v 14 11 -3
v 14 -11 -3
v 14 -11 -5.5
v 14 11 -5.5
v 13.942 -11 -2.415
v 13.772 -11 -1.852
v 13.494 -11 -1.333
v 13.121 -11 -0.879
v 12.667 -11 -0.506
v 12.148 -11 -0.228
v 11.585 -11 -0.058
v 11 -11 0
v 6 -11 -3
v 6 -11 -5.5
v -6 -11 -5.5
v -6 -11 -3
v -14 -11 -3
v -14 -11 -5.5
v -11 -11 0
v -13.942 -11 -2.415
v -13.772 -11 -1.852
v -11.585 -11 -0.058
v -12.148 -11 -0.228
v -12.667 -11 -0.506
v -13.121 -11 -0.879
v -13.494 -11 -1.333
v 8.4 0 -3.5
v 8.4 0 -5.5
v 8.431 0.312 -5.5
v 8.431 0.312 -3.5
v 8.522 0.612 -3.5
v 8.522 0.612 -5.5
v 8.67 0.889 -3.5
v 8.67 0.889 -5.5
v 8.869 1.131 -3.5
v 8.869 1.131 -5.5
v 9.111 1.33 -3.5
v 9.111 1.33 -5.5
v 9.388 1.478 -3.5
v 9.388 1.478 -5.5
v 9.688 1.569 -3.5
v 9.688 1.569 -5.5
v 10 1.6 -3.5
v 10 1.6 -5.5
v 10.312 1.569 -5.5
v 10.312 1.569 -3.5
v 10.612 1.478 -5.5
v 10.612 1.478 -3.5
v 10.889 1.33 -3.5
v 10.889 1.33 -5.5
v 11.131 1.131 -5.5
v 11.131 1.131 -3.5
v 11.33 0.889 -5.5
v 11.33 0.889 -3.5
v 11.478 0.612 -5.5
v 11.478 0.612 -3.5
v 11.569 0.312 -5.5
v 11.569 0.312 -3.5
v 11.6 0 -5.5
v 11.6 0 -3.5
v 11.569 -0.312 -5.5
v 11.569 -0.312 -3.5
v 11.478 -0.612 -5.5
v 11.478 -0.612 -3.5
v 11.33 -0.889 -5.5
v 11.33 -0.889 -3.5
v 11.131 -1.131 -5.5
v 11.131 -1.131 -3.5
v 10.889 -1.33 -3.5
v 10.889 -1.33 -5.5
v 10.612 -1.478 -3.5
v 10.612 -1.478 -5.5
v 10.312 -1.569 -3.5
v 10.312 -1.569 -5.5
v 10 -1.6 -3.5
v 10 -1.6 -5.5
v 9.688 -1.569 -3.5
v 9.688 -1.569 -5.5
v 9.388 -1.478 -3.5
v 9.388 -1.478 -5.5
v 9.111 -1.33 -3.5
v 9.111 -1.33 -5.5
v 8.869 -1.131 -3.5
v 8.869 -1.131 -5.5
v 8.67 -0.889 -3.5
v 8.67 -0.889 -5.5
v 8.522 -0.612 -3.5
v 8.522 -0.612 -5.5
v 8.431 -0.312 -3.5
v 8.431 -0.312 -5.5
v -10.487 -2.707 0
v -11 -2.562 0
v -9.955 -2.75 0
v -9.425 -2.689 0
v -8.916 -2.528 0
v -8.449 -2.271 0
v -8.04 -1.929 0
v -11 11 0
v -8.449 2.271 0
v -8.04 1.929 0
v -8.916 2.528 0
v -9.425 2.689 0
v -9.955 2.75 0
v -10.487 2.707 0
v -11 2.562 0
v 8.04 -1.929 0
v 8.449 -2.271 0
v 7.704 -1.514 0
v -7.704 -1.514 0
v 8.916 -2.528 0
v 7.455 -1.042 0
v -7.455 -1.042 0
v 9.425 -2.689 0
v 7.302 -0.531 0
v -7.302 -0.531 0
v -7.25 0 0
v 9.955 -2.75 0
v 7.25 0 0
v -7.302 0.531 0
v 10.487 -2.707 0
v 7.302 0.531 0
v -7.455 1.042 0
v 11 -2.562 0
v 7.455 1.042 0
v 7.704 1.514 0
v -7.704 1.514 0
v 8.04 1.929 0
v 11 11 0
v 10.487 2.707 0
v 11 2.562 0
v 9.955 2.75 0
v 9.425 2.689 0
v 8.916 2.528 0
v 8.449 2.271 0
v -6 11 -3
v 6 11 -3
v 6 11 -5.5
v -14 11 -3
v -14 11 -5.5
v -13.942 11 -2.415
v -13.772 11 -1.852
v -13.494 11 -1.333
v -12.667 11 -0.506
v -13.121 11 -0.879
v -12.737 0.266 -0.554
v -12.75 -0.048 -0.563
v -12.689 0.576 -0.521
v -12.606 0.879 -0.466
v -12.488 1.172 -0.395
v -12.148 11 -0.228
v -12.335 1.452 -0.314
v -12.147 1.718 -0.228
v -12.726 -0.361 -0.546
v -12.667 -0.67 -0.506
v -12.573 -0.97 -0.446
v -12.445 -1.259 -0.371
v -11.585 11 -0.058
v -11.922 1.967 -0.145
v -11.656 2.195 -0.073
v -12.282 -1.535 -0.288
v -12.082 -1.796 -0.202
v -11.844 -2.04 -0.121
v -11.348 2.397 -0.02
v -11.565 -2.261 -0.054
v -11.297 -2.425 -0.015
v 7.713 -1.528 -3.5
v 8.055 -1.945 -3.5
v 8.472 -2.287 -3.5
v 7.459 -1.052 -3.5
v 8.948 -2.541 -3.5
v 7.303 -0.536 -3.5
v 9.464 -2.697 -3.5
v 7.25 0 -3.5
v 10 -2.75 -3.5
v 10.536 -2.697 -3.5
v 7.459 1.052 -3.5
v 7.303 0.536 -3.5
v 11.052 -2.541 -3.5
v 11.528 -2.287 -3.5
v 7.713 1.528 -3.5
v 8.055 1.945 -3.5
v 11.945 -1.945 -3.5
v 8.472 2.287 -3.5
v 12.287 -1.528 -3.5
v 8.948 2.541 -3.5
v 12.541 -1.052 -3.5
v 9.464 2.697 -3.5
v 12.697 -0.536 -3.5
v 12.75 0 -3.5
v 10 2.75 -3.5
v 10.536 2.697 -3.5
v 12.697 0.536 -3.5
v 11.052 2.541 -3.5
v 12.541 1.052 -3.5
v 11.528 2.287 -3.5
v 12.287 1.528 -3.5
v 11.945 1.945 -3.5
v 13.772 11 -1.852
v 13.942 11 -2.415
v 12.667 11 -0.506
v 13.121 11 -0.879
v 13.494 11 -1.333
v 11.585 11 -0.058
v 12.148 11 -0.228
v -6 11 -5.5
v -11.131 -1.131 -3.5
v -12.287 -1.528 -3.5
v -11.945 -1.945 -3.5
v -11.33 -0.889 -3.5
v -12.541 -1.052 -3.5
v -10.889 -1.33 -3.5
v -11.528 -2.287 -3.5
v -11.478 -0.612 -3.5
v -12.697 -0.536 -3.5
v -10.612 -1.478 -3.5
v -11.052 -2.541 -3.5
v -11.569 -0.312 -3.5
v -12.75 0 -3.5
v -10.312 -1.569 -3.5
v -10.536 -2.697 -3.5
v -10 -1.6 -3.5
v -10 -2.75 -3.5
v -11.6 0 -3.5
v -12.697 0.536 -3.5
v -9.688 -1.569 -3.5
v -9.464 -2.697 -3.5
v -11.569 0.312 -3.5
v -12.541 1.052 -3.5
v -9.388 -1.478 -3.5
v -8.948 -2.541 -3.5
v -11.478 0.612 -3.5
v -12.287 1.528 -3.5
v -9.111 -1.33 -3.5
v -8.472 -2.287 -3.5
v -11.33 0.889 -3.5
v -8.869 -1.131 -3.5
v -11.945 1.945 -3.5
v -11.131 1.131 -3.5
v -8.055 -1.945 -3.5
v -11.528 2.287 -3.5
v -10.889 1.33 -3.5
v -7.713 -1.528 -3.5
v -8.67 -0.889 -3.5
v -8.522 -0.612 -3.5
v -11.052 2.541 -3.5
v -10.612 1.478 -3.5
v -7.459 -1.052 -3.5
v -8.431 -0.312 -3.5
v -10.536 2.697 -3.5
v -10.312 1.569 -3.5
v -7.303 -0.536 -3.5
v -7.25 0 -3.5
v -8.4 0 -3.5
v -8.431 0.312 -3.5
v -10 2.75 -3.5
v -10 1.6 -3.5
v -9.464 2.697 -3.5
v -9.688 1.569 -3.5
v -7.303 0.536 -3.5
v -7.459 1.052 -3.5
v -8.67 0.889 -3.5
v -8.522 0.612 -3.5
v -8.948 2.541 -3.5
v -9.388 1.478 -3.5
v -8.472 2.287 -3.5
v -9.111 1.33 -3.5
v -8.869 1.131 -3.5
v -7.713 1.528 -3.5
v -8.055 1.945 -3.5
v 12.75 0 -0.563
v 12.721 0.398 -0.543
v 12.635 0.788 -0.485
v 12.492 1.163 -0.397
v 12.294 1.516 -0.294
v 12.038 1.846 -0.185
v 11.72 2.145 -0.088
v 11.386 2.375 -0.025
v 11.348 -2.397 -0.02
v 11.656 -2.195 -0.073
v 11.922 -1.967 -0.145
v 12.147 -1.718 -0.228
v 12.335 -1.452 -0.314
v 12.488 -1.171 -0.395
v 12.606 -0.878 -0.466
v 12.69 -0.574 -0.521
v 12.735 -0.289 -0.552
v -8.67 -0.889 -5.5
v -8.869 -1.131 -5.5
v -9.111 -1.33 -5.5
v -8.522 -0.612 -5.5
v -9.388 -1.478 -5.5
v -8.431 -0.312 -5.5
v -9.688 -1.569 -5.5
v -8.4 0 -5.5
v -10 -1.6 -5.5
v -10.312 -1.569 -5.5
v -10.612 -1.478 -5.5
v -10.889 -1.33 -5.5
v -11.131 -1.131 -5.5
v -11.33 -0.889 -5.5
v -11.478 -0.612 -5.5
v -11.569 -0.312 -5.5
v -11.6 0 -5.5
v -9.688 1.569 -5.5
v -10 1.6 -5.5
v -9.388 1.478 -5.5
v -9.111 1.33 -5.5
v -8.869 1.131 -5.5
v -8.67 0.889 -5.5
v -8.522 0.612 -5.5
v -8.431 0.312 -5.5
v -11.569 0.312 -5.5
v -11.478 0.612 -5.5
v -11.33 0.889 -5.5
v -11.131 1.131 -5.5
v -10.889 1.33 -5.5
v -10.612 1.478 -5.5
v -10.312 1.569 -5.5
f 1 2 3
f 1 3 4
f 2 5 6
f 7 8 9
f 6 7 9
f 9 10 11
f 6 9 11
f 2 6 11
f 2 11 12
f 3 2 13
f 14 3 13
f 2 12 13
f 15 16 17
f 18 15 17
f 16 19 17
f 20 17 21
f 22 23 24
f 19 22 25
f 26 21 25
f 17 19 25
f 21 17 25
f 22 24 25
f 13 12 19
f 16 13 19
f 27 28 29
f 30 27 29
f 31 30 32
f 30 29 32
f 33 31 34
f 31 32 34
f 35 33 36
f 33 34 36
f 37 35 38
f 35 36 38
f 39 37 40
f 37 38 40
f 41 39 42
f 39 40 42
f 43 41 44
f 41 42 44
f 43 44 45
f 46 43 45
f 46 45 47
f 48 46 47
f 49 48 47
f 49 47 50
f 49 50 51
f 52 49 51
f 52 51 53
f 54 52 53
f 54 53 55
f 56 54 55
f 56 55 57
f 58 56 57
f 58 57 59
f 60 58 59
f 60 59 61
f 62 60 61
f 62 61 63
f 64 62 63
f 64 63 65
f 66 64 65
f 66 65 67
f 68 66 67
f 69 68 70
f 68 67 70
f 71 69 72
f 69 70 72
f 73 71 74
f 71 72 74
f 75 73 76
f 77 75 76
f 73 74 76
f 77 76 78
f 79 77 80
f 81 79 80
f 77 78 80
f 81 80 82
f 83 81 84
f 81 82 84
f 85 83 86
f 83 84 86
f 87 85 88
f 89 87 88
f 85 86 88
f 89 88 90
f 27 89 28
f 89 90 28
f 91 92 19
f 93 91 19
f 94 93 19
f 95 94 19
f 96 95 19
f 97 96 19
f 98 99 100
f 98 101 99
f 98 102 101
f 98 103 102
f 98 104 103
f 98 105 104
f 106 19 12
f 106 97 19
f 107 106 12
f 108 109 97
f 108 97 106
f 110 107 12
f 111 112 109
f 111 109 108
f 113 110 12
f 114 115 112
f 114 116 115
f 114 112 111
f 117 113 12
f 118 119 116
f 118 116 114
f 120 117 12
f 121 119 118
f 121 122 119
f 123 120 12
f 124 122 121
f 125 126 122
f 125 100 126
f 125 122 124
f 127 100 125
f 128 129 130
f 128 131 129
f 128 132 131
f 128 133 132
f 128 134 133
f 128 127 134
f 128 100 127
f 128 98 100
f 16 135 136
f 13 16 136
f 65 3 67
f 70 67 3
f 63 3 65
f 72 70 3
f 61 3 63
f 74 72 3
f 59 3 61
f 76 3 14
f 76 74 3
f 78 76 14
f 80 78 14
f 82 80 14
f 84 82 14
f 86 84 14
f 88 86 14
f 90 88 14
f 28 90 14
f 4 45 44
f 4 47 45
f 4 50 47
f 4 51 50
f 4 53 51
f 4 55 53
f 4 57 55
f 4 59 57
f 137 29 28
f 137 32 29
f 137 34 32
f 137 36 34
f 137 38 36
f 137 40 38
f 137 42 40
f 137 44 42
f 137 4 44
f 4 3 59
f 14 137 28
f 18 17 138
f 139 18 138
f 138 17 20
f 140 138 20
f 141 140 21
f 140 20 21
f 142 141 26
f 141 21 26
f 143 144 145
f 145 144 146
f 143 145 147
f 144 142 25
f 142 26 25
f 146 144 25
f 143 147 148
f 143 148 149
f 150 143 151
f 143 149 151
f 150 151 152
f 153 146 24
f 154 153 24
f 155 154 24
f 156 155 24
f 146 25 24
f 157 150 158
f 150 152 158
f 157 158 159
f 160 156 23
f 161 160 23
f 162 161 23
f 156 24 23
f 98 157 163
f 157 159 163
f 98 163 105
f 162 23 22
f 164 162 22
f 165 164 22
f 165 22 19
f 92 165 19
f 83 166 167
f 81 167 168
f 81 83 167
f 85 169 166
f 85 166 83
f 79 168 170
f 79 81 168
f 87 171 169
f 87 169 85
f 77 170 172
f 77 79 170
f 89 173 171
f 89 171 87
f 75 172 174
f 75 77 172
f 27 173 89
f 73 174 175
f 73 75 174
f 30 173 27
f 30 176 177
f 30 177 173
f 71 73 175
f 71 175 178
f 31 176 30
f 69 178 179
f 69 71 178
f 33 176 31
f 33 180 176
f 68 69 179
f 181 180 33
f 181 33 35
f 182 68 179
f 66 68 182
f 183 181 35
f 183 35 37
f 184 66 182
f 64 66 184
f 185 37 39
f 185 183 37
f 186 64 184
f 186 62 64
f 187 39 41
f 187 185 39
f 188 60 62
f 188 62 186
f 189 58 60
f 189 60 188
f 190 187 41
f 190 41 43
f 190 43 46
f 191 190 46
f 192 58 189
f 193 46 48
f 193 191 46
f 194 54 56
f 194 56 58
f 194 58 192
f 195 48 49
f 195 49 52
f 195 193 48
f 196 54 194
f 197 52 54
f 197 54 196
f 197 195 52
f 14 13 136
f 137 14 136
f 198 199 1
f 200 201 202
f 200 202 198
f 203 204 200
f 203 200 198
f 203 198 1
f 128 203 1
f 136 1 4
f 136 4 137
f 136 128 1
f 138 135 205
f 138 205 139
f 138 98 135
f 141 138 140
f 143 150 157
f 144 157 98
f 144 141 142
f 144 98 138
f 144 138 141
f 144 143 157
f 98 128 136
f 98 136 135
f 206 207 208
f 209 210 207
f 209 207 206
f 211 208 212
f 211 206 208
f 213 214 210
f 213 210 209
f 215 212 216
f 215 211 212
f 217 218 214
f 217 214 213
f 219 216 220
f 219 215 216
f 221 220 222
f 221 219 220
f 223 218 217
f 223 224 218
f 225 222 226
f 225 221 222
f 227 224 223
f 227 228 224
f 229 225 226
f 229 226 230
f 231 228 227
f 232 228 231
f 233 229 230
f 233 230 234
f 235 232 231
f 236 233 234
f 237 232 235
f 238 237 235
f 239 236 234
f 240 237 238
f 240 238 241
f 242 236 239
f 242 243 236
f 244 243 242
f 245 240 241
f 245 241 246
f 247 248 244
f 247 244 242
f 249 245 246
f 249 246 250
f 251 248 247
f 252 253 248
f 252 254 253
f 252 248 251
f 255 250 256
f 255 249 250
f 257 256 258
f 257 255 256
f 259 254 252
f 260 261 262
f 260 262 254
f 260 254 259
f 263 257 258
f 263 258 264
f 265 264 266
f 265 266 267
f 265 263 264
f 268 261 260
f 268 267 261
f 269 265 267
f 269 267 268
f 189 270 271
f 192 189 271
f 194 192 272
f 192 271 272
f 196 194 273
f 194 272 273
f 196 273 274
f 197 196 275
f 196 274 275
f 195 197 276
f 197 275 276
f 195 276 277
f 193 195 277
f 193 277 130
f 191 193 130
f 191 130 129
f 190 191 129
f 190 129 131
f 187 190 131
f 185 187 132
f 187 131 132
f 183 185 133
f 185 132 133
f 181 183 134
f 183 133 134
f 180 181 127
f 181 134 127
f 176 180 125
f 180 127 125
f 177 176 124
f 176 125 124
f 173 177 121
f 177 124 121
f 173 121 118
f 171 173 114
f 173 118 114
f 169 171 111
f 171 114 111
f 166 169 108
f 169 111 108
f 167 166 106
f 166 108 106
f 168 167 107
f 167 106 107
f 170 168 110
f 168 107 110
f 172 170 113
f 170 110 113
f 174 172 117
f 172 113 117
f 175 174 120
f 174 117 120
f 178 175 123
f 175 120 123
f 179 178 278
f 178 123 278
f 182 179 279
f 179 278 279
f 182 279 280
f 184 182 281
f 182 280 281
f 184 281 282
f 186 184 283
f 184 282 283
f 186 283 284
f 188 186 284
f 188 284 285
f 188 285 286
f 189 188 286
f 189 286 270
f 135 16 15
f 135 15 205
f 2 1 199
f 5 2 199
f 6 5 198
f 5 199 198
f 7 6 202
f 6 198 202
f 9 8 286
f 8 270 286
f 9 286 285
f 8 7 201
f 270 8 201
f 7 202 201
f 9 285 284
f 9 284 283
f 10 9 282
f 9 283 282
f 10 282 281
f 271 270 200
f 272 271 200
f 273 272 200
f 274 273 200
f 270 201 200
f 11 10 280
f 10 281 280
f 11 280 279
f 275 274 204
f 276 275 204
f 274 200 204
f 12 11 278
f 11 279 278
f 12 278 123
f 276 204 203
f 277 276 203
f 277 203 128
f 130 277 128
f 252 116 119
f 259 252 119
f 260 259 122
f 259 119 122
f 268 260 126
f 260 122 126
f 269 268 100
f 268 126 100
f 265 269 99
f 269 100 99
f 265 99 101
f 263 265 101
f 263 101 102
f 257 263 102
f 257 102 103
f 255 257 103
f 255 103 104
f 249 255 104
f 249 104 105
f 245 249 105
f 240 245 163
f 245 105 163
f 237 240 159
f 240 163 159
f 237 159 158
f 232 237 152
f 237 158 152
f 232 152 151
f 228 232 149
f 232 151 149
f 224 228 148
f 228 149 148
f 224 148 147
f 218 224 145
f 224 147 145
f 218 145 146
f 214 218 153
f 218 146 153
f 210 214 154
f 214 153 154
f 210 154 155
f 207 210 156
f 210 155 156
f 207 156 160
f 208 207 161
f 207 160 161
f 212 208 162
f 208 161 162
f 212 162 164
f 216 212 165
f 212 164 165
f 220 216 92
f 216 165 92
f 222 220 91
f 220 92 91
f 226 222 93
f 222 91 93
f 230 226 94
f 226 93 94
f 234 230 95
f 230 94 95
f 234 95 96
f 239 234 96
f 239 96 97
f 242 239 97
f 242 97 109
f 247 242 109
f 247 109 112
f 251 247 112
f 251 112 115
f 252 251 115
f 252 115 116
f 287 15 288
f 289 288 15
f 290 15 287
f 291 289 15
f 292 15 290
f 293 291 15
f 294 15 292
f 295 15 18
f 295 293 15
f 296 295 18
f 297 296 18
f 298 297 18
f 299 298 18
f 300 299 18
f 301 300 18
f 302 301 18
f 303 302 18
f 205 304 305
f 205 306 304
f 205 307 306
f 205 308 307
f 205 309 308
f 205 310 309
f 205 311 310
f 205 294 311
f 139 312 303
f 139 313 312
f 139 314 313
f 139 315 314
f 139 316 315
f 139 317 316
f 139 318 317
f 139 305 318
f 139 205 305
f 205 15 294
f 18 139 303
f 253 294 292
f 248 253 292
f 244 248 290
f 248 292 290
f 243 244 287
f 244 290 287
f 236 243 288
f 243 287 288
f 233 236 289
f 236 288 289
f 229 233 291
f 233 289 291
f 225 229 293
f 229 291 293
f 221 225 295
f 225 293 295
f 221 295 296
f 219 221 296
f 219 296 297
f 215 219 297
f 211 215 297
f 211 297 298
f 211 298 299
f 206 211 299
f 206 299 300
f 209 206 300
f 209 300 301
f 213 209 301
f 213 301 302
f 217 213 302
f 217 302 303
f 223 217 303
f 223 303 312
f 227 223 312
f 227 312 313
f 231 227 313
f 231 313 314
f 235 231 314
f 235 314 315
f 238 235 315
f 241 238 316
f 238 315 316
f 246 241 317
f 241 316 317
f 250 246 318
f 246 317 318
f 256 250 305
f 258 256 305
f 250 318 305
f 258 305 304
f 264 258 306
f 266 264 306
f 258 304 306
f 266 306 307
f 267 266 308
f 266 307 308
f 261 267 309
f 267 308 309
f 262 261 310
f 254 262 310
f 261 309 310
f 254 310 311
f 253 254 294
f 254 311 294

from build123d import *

# Parameters (mm, degrees)
SKETCH1_W           = 28
SKETCH1_H           = 22
BOSS_EXTRUDE1_DEPTH = 3
SKETCH2_W           = 8
SKETCH2_H           = 22
BOSS_EXTRUDE2_DEPTH = 2.5
SKETCH3_R           = 1.6
CUT_EXTRUDE1_DEPTH  = 19.634645154
SKETCH4_R           = 2.75
CUT_EXTRUDE2_DEPTH  = 3.5
FILLET1_R           = 3


with BuildPart() as part:
    # Sketch1 → Boss-Extrude1 (new body)
    with BuildSketch(Plane.XY):
        Rectangle(SKETCH1_W, SKETCH1_H)
    extrude(amount=-BOSS_EXTRUDE1_DEPTH)

    # Sketch2 → Boss-Extrude2 (add)
    with BuildSketch(Plane(origin=(0, 0, -3), x_dir=(-1, 0, 0), z_dir=(0, 0, -1))):
        with Locations((10, 0)):
            Rectangle(SKETCH2_W, SKETCH2_H)
        with Locations((-10, 0)):
            Rectangle(SKETCH2_W, SKETCH2_H)
    extrude(amount=BOSS_EXTRUDE2_DEPTH)

    # Sketch3 → Cut-Extrude1 (cut, through all)
    with BuildSketch(Plane(origin=(0, 0, -5.5), x_dir=(-1, 0, 0), z_dir=(0, 0, -1))):
        with Locations((-10, 0)):
            Circle(SKETCH3_R)
        with Locations(Location((10, 0, 0), (0, 0, 180))):
            Circle(SKETCH3_R)
    extrude(amount=-CUT_EXTRUDE1_DEPTH, mode=Mode.SUBTRACT)

    # Sketch4 → Cut-Extrude2 (cut)
    with BuildSketch(Plane.XY):
        with Locations((-10, 0)):
            Circle(SKETCH4_R)
        with Locations((10, 0)):
            Circle(SKETCH4_R)
    extrude(amount=-CUT_EXTRUDE2_DEPTH, mode=Mode.SUBTRACT)

    # Fillet1
    # the kernel refuses this fillet: 3 mm, written as the material it takes off along each edge
    with BuildSketch(Plane(origin=(14, 18.5, 0), x_dir=(0, 0, -1), z_dir=(0, -1, 0)), Plane(origin=(-14, -18.5, 0), x_dir=(0, 0, -1), z_dir=(0, 1, 0))) as fillet1_piece_1:
        with BuildLine():
            CenterArc((FILLET1_R, -FILLET1_R), FILLET1_R, 90, 90)
            Line((0, -FILLET1_R), (0, 0))
            Line((0, 0), (FILLET1_R, 0))
        make_face()
    extrude(amount=37, mode=Mode.SUBTRACT)


solid = part.part
